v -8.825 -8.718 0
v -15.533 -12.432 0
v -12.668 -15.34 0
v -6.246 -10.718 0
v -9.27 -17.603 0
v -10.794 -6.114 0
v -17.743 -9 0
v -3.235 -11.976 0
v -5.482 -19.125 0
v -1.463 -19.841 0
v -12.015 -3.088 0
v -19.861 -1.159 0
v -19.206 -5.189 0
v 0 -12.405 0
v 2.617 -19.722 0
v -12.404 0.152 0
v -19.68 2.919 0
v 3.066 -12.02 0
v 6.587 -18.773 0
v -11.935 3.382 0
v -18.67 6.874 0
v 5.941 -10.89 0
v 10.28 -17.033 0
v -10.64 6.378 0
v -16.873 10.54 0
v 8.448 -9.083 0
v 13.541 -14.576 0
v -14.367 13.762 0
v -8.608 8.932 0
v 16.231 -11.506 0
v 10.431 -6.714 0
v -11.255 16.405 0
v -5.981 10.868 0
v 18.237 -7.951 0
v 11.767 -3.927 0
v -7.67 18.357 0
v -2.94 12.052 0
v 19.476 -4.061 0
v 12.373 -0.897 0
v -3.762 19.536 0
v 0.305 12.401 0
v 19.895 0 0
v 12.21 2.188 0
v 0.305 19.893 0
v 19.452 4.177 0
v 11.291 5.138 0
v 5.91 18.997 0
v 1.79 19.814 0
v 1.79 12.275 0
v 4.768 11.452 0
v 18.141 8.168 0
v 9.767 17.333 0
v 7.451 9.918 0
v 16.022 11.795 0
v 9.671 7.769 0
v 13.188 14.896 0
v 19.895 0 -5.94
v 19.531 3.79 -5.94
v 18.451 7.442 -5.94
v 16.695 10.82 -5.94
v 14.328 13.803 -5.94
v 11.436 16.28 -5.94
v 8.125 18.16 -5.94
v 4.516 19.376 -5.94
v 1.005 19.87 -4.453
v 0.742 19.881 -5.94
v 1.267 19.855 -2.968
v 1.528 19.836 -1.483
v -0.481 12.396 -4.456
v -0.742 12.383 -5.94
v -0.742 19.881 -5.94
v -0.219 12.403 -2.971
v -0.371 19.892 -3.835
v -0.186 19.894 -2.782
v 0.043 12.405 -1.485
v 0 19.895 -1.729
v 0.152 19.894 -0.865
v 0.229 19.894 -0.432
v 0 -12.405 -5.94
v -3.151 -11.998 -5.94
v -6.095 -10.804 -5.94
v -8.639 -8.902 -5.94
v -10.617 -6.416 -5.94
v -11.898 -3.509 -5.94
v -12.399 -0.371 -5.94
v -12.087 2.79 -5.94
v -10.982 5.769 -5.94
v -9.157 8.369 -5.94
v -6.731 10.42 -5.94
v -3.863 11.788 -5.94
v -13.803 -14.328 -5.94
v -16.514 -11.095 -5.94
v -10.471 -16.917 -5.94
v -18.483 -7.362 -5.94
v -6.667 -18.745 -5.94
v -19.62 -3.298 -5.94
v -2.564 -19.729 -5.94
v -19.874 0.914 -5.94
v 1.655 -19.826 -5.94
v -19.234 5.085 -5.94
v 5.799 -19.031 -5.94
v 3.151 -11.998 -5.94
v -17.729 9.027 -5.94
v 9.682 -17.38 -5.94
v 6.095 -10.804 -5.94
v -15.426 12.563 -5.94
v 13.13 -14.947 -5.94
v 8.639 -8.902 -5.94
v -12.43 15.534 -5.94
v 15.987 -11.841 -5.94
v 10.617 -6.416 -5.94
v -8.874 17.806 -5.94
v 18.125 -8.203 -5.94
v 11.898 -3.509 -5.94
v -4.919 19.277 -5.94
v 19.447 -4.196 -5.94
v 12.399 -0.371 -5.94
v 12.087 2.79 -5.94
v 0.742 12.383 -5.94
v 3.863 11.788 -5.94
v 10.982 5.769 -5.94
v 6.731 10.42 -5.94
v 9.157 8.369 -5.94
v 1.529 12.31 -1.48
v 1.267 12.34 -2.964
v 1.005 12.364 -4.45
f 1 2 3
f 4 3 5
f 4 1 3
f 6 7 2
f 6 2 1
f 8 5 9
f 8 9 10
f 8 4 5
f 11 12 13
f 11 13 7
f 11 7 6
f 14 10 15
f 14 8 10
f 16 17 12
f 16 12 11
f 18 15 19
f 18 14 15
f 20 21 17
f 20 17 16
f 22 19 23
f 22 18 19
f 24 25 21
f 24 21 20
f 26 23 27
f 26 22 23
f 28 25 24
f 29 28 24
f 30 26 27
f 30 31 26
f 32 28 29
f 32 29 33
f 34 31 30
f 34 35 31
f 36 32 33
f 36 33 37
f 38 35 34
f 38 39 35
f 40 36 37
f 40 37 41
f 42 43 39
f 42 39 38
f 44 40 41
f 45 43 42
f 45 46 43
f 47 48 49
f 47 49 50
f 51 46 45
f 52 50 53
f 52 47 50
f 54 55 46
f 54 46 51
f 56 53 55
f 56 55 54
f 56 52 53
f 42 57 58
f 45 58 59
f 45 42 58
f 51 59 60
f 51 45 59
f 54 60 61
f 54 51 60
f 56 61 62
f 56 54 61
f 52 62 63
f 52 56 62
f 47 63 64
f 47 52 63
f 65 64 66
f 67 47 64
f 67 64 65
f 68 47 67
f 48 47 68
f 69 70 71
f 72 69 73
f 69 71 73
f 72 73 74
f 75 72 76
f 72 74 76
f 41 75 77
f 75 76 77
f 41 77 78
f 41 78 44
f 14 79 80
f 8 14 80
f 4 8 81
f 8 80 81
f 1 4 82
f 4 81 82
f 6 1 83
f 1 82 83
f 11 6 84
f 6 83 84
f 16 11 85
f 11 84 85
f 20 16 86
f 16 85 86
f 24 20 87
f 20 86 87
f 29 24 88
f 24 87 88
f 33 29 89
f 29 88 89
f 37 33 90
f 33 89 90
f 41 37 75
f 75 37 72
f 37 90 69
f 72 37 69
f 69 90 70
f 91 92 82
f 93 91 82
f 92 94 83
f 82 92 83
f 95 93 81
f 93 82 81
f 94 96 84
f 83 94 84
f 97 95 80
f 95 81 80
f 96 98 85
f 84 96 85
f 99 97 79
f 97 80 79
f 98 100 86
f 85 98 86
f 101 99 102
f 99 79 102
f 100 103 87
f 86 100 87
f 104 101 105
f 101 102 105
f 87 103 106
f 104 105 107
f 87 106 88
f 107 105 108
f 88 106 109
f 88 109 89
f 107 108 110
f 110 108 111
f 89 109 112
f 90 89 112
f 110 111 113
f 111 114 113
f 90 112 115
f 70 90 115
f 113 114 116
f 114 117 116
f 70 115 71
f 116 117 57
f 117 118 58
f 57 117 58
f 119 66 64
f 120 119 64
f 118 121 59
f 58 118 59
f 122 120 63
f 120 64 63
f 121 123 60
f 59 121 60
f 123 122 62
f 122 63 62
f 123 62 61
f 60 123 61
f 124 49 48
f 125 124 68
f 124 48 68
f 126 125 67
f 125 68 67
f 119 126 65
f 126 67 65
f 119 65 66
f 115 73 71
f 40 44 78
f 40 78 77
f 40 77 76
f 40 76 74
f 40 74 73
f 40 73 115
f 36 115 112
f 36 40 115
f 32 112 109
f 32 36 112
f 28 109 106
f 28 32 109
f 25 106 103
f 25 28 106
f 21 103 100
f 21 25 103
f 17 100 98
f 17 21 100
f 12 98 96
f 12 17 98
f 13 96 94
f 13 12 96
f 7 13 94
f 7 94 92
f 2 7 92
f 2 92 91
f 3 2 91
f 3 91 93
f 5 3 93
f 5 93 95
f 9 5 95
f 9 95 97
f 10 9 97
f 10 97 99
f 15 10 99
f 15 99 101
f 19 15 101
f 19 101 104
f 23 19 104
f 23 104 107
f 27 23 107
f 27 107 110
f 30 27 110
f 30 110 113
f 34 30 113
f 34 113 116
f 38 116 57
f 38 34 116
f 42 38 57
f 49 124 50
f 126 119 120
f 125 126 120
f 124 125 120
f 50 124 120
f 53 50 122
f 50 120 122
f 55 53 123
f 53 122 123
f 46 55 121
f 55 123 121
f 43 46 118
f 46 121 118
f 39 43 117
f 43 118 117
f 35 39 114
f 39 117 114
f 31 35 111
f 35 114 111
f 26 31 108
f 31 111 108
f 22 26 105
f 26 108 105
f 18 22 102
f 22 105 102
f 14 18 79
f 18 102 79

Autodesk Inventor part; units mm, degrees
ref_plane "WorkPlane1" through (0, 0, 0) normal (0, 0, 1) x (1, 0, 0)
ref_plane "WorkPlane3" through (0, 0, -5.94) normal (0, 0, 1) x (1, 0, 0)
ref_plane "Work Plane3" through (0, -19.895, 0) normal (0, 1, 0) x (-1, 0, 0)
ref_plane "WorkPlane10" through (0, 19.895, 0) normal (0, 1, 0) x (-1, 0, 0)
sketch "Sketch1" plane through (0, 0, 0) normal (0, 0, 1) x (1, 0, 0)
  point P0 (0, 0)
sketch "Sketch2" plane through (0, 0, 0) normal (0, 0, 1) x (1, 0, 0)
  circle A0 centre (0, 0) radius 19.895
  dimension "d3" = 39.79
extrude "Extrusion1" add sketch "Sketch2" against normal blind 5.94
sketch "Sketch3" plane through (0, 0, -5.94) normal (0, 0, 1) x (1, 0, 0)
  point P0 (0, 0)
sketch "Sketch4" plane through (0, 0, 0) normal (0, 0, 1) x (1, 0, 0)
  circle A0 centre (0, 0) radius 19.895 projected
hole "Hole1" at (0, 0, 0) direction (0, 0, -1) diameter 24.81 end through all
sketch "Sketch5" plane through (0, 19.895, 0) normal (0, 1, 0) x (-1, 0, 0)
  line L0 (-0.3049, 0) -> (-1.7899, 0)
  line L1 (0.7425, -5.94) -> (-0.3049, 0)
  line L2 (-0.7425, -5.94) -> (0.7425, -5.94)
  line L3 (-1.7899, 0) -> (-0.7425, -5.94)
  line L4 (-12.405, 0) -> (12.405, 0) construction
  line L5 (19.895, -5.94) -> (-19.895, -5.94) construction
  line L6 (0, -7.128) -> (0, 1.188) projected
  dimension "d15" = 80
  dimension "d18" = 0.7425
  dimension "d19" = 0.7425
extrude "Extrusion2" cut sketch "Sketch5" against normal blind 19.895
ref_plane "MSC_PT1" through (0, 0, 0) normal (0, 0, 1) x (1, 0, 0)
ref_plane "MSC_PT2" through (0, 0, -5.94) normal (0, 0, -1) x (-1, 0, 0)
equation "\"d7\" = Diam1"
equation "\"d4\" = ParH"
equation "\"d18\" = 0.125 * ParH"
equation "\"d19\" = 0.125 * ParH"
equation "\"d16\" = 0.5 * Diam2"
equation "\"d3\" = Diam2"
equation "\"Diam2\" = 39.79"
equation "\"ParH\" = 5.94"
equation "\"Diam1\" = 24.81"
equation "\"d20\" = 0.5 * Diam2"
properties part number "ASME B18.21.2M - 24" material "Steel, Mild"
